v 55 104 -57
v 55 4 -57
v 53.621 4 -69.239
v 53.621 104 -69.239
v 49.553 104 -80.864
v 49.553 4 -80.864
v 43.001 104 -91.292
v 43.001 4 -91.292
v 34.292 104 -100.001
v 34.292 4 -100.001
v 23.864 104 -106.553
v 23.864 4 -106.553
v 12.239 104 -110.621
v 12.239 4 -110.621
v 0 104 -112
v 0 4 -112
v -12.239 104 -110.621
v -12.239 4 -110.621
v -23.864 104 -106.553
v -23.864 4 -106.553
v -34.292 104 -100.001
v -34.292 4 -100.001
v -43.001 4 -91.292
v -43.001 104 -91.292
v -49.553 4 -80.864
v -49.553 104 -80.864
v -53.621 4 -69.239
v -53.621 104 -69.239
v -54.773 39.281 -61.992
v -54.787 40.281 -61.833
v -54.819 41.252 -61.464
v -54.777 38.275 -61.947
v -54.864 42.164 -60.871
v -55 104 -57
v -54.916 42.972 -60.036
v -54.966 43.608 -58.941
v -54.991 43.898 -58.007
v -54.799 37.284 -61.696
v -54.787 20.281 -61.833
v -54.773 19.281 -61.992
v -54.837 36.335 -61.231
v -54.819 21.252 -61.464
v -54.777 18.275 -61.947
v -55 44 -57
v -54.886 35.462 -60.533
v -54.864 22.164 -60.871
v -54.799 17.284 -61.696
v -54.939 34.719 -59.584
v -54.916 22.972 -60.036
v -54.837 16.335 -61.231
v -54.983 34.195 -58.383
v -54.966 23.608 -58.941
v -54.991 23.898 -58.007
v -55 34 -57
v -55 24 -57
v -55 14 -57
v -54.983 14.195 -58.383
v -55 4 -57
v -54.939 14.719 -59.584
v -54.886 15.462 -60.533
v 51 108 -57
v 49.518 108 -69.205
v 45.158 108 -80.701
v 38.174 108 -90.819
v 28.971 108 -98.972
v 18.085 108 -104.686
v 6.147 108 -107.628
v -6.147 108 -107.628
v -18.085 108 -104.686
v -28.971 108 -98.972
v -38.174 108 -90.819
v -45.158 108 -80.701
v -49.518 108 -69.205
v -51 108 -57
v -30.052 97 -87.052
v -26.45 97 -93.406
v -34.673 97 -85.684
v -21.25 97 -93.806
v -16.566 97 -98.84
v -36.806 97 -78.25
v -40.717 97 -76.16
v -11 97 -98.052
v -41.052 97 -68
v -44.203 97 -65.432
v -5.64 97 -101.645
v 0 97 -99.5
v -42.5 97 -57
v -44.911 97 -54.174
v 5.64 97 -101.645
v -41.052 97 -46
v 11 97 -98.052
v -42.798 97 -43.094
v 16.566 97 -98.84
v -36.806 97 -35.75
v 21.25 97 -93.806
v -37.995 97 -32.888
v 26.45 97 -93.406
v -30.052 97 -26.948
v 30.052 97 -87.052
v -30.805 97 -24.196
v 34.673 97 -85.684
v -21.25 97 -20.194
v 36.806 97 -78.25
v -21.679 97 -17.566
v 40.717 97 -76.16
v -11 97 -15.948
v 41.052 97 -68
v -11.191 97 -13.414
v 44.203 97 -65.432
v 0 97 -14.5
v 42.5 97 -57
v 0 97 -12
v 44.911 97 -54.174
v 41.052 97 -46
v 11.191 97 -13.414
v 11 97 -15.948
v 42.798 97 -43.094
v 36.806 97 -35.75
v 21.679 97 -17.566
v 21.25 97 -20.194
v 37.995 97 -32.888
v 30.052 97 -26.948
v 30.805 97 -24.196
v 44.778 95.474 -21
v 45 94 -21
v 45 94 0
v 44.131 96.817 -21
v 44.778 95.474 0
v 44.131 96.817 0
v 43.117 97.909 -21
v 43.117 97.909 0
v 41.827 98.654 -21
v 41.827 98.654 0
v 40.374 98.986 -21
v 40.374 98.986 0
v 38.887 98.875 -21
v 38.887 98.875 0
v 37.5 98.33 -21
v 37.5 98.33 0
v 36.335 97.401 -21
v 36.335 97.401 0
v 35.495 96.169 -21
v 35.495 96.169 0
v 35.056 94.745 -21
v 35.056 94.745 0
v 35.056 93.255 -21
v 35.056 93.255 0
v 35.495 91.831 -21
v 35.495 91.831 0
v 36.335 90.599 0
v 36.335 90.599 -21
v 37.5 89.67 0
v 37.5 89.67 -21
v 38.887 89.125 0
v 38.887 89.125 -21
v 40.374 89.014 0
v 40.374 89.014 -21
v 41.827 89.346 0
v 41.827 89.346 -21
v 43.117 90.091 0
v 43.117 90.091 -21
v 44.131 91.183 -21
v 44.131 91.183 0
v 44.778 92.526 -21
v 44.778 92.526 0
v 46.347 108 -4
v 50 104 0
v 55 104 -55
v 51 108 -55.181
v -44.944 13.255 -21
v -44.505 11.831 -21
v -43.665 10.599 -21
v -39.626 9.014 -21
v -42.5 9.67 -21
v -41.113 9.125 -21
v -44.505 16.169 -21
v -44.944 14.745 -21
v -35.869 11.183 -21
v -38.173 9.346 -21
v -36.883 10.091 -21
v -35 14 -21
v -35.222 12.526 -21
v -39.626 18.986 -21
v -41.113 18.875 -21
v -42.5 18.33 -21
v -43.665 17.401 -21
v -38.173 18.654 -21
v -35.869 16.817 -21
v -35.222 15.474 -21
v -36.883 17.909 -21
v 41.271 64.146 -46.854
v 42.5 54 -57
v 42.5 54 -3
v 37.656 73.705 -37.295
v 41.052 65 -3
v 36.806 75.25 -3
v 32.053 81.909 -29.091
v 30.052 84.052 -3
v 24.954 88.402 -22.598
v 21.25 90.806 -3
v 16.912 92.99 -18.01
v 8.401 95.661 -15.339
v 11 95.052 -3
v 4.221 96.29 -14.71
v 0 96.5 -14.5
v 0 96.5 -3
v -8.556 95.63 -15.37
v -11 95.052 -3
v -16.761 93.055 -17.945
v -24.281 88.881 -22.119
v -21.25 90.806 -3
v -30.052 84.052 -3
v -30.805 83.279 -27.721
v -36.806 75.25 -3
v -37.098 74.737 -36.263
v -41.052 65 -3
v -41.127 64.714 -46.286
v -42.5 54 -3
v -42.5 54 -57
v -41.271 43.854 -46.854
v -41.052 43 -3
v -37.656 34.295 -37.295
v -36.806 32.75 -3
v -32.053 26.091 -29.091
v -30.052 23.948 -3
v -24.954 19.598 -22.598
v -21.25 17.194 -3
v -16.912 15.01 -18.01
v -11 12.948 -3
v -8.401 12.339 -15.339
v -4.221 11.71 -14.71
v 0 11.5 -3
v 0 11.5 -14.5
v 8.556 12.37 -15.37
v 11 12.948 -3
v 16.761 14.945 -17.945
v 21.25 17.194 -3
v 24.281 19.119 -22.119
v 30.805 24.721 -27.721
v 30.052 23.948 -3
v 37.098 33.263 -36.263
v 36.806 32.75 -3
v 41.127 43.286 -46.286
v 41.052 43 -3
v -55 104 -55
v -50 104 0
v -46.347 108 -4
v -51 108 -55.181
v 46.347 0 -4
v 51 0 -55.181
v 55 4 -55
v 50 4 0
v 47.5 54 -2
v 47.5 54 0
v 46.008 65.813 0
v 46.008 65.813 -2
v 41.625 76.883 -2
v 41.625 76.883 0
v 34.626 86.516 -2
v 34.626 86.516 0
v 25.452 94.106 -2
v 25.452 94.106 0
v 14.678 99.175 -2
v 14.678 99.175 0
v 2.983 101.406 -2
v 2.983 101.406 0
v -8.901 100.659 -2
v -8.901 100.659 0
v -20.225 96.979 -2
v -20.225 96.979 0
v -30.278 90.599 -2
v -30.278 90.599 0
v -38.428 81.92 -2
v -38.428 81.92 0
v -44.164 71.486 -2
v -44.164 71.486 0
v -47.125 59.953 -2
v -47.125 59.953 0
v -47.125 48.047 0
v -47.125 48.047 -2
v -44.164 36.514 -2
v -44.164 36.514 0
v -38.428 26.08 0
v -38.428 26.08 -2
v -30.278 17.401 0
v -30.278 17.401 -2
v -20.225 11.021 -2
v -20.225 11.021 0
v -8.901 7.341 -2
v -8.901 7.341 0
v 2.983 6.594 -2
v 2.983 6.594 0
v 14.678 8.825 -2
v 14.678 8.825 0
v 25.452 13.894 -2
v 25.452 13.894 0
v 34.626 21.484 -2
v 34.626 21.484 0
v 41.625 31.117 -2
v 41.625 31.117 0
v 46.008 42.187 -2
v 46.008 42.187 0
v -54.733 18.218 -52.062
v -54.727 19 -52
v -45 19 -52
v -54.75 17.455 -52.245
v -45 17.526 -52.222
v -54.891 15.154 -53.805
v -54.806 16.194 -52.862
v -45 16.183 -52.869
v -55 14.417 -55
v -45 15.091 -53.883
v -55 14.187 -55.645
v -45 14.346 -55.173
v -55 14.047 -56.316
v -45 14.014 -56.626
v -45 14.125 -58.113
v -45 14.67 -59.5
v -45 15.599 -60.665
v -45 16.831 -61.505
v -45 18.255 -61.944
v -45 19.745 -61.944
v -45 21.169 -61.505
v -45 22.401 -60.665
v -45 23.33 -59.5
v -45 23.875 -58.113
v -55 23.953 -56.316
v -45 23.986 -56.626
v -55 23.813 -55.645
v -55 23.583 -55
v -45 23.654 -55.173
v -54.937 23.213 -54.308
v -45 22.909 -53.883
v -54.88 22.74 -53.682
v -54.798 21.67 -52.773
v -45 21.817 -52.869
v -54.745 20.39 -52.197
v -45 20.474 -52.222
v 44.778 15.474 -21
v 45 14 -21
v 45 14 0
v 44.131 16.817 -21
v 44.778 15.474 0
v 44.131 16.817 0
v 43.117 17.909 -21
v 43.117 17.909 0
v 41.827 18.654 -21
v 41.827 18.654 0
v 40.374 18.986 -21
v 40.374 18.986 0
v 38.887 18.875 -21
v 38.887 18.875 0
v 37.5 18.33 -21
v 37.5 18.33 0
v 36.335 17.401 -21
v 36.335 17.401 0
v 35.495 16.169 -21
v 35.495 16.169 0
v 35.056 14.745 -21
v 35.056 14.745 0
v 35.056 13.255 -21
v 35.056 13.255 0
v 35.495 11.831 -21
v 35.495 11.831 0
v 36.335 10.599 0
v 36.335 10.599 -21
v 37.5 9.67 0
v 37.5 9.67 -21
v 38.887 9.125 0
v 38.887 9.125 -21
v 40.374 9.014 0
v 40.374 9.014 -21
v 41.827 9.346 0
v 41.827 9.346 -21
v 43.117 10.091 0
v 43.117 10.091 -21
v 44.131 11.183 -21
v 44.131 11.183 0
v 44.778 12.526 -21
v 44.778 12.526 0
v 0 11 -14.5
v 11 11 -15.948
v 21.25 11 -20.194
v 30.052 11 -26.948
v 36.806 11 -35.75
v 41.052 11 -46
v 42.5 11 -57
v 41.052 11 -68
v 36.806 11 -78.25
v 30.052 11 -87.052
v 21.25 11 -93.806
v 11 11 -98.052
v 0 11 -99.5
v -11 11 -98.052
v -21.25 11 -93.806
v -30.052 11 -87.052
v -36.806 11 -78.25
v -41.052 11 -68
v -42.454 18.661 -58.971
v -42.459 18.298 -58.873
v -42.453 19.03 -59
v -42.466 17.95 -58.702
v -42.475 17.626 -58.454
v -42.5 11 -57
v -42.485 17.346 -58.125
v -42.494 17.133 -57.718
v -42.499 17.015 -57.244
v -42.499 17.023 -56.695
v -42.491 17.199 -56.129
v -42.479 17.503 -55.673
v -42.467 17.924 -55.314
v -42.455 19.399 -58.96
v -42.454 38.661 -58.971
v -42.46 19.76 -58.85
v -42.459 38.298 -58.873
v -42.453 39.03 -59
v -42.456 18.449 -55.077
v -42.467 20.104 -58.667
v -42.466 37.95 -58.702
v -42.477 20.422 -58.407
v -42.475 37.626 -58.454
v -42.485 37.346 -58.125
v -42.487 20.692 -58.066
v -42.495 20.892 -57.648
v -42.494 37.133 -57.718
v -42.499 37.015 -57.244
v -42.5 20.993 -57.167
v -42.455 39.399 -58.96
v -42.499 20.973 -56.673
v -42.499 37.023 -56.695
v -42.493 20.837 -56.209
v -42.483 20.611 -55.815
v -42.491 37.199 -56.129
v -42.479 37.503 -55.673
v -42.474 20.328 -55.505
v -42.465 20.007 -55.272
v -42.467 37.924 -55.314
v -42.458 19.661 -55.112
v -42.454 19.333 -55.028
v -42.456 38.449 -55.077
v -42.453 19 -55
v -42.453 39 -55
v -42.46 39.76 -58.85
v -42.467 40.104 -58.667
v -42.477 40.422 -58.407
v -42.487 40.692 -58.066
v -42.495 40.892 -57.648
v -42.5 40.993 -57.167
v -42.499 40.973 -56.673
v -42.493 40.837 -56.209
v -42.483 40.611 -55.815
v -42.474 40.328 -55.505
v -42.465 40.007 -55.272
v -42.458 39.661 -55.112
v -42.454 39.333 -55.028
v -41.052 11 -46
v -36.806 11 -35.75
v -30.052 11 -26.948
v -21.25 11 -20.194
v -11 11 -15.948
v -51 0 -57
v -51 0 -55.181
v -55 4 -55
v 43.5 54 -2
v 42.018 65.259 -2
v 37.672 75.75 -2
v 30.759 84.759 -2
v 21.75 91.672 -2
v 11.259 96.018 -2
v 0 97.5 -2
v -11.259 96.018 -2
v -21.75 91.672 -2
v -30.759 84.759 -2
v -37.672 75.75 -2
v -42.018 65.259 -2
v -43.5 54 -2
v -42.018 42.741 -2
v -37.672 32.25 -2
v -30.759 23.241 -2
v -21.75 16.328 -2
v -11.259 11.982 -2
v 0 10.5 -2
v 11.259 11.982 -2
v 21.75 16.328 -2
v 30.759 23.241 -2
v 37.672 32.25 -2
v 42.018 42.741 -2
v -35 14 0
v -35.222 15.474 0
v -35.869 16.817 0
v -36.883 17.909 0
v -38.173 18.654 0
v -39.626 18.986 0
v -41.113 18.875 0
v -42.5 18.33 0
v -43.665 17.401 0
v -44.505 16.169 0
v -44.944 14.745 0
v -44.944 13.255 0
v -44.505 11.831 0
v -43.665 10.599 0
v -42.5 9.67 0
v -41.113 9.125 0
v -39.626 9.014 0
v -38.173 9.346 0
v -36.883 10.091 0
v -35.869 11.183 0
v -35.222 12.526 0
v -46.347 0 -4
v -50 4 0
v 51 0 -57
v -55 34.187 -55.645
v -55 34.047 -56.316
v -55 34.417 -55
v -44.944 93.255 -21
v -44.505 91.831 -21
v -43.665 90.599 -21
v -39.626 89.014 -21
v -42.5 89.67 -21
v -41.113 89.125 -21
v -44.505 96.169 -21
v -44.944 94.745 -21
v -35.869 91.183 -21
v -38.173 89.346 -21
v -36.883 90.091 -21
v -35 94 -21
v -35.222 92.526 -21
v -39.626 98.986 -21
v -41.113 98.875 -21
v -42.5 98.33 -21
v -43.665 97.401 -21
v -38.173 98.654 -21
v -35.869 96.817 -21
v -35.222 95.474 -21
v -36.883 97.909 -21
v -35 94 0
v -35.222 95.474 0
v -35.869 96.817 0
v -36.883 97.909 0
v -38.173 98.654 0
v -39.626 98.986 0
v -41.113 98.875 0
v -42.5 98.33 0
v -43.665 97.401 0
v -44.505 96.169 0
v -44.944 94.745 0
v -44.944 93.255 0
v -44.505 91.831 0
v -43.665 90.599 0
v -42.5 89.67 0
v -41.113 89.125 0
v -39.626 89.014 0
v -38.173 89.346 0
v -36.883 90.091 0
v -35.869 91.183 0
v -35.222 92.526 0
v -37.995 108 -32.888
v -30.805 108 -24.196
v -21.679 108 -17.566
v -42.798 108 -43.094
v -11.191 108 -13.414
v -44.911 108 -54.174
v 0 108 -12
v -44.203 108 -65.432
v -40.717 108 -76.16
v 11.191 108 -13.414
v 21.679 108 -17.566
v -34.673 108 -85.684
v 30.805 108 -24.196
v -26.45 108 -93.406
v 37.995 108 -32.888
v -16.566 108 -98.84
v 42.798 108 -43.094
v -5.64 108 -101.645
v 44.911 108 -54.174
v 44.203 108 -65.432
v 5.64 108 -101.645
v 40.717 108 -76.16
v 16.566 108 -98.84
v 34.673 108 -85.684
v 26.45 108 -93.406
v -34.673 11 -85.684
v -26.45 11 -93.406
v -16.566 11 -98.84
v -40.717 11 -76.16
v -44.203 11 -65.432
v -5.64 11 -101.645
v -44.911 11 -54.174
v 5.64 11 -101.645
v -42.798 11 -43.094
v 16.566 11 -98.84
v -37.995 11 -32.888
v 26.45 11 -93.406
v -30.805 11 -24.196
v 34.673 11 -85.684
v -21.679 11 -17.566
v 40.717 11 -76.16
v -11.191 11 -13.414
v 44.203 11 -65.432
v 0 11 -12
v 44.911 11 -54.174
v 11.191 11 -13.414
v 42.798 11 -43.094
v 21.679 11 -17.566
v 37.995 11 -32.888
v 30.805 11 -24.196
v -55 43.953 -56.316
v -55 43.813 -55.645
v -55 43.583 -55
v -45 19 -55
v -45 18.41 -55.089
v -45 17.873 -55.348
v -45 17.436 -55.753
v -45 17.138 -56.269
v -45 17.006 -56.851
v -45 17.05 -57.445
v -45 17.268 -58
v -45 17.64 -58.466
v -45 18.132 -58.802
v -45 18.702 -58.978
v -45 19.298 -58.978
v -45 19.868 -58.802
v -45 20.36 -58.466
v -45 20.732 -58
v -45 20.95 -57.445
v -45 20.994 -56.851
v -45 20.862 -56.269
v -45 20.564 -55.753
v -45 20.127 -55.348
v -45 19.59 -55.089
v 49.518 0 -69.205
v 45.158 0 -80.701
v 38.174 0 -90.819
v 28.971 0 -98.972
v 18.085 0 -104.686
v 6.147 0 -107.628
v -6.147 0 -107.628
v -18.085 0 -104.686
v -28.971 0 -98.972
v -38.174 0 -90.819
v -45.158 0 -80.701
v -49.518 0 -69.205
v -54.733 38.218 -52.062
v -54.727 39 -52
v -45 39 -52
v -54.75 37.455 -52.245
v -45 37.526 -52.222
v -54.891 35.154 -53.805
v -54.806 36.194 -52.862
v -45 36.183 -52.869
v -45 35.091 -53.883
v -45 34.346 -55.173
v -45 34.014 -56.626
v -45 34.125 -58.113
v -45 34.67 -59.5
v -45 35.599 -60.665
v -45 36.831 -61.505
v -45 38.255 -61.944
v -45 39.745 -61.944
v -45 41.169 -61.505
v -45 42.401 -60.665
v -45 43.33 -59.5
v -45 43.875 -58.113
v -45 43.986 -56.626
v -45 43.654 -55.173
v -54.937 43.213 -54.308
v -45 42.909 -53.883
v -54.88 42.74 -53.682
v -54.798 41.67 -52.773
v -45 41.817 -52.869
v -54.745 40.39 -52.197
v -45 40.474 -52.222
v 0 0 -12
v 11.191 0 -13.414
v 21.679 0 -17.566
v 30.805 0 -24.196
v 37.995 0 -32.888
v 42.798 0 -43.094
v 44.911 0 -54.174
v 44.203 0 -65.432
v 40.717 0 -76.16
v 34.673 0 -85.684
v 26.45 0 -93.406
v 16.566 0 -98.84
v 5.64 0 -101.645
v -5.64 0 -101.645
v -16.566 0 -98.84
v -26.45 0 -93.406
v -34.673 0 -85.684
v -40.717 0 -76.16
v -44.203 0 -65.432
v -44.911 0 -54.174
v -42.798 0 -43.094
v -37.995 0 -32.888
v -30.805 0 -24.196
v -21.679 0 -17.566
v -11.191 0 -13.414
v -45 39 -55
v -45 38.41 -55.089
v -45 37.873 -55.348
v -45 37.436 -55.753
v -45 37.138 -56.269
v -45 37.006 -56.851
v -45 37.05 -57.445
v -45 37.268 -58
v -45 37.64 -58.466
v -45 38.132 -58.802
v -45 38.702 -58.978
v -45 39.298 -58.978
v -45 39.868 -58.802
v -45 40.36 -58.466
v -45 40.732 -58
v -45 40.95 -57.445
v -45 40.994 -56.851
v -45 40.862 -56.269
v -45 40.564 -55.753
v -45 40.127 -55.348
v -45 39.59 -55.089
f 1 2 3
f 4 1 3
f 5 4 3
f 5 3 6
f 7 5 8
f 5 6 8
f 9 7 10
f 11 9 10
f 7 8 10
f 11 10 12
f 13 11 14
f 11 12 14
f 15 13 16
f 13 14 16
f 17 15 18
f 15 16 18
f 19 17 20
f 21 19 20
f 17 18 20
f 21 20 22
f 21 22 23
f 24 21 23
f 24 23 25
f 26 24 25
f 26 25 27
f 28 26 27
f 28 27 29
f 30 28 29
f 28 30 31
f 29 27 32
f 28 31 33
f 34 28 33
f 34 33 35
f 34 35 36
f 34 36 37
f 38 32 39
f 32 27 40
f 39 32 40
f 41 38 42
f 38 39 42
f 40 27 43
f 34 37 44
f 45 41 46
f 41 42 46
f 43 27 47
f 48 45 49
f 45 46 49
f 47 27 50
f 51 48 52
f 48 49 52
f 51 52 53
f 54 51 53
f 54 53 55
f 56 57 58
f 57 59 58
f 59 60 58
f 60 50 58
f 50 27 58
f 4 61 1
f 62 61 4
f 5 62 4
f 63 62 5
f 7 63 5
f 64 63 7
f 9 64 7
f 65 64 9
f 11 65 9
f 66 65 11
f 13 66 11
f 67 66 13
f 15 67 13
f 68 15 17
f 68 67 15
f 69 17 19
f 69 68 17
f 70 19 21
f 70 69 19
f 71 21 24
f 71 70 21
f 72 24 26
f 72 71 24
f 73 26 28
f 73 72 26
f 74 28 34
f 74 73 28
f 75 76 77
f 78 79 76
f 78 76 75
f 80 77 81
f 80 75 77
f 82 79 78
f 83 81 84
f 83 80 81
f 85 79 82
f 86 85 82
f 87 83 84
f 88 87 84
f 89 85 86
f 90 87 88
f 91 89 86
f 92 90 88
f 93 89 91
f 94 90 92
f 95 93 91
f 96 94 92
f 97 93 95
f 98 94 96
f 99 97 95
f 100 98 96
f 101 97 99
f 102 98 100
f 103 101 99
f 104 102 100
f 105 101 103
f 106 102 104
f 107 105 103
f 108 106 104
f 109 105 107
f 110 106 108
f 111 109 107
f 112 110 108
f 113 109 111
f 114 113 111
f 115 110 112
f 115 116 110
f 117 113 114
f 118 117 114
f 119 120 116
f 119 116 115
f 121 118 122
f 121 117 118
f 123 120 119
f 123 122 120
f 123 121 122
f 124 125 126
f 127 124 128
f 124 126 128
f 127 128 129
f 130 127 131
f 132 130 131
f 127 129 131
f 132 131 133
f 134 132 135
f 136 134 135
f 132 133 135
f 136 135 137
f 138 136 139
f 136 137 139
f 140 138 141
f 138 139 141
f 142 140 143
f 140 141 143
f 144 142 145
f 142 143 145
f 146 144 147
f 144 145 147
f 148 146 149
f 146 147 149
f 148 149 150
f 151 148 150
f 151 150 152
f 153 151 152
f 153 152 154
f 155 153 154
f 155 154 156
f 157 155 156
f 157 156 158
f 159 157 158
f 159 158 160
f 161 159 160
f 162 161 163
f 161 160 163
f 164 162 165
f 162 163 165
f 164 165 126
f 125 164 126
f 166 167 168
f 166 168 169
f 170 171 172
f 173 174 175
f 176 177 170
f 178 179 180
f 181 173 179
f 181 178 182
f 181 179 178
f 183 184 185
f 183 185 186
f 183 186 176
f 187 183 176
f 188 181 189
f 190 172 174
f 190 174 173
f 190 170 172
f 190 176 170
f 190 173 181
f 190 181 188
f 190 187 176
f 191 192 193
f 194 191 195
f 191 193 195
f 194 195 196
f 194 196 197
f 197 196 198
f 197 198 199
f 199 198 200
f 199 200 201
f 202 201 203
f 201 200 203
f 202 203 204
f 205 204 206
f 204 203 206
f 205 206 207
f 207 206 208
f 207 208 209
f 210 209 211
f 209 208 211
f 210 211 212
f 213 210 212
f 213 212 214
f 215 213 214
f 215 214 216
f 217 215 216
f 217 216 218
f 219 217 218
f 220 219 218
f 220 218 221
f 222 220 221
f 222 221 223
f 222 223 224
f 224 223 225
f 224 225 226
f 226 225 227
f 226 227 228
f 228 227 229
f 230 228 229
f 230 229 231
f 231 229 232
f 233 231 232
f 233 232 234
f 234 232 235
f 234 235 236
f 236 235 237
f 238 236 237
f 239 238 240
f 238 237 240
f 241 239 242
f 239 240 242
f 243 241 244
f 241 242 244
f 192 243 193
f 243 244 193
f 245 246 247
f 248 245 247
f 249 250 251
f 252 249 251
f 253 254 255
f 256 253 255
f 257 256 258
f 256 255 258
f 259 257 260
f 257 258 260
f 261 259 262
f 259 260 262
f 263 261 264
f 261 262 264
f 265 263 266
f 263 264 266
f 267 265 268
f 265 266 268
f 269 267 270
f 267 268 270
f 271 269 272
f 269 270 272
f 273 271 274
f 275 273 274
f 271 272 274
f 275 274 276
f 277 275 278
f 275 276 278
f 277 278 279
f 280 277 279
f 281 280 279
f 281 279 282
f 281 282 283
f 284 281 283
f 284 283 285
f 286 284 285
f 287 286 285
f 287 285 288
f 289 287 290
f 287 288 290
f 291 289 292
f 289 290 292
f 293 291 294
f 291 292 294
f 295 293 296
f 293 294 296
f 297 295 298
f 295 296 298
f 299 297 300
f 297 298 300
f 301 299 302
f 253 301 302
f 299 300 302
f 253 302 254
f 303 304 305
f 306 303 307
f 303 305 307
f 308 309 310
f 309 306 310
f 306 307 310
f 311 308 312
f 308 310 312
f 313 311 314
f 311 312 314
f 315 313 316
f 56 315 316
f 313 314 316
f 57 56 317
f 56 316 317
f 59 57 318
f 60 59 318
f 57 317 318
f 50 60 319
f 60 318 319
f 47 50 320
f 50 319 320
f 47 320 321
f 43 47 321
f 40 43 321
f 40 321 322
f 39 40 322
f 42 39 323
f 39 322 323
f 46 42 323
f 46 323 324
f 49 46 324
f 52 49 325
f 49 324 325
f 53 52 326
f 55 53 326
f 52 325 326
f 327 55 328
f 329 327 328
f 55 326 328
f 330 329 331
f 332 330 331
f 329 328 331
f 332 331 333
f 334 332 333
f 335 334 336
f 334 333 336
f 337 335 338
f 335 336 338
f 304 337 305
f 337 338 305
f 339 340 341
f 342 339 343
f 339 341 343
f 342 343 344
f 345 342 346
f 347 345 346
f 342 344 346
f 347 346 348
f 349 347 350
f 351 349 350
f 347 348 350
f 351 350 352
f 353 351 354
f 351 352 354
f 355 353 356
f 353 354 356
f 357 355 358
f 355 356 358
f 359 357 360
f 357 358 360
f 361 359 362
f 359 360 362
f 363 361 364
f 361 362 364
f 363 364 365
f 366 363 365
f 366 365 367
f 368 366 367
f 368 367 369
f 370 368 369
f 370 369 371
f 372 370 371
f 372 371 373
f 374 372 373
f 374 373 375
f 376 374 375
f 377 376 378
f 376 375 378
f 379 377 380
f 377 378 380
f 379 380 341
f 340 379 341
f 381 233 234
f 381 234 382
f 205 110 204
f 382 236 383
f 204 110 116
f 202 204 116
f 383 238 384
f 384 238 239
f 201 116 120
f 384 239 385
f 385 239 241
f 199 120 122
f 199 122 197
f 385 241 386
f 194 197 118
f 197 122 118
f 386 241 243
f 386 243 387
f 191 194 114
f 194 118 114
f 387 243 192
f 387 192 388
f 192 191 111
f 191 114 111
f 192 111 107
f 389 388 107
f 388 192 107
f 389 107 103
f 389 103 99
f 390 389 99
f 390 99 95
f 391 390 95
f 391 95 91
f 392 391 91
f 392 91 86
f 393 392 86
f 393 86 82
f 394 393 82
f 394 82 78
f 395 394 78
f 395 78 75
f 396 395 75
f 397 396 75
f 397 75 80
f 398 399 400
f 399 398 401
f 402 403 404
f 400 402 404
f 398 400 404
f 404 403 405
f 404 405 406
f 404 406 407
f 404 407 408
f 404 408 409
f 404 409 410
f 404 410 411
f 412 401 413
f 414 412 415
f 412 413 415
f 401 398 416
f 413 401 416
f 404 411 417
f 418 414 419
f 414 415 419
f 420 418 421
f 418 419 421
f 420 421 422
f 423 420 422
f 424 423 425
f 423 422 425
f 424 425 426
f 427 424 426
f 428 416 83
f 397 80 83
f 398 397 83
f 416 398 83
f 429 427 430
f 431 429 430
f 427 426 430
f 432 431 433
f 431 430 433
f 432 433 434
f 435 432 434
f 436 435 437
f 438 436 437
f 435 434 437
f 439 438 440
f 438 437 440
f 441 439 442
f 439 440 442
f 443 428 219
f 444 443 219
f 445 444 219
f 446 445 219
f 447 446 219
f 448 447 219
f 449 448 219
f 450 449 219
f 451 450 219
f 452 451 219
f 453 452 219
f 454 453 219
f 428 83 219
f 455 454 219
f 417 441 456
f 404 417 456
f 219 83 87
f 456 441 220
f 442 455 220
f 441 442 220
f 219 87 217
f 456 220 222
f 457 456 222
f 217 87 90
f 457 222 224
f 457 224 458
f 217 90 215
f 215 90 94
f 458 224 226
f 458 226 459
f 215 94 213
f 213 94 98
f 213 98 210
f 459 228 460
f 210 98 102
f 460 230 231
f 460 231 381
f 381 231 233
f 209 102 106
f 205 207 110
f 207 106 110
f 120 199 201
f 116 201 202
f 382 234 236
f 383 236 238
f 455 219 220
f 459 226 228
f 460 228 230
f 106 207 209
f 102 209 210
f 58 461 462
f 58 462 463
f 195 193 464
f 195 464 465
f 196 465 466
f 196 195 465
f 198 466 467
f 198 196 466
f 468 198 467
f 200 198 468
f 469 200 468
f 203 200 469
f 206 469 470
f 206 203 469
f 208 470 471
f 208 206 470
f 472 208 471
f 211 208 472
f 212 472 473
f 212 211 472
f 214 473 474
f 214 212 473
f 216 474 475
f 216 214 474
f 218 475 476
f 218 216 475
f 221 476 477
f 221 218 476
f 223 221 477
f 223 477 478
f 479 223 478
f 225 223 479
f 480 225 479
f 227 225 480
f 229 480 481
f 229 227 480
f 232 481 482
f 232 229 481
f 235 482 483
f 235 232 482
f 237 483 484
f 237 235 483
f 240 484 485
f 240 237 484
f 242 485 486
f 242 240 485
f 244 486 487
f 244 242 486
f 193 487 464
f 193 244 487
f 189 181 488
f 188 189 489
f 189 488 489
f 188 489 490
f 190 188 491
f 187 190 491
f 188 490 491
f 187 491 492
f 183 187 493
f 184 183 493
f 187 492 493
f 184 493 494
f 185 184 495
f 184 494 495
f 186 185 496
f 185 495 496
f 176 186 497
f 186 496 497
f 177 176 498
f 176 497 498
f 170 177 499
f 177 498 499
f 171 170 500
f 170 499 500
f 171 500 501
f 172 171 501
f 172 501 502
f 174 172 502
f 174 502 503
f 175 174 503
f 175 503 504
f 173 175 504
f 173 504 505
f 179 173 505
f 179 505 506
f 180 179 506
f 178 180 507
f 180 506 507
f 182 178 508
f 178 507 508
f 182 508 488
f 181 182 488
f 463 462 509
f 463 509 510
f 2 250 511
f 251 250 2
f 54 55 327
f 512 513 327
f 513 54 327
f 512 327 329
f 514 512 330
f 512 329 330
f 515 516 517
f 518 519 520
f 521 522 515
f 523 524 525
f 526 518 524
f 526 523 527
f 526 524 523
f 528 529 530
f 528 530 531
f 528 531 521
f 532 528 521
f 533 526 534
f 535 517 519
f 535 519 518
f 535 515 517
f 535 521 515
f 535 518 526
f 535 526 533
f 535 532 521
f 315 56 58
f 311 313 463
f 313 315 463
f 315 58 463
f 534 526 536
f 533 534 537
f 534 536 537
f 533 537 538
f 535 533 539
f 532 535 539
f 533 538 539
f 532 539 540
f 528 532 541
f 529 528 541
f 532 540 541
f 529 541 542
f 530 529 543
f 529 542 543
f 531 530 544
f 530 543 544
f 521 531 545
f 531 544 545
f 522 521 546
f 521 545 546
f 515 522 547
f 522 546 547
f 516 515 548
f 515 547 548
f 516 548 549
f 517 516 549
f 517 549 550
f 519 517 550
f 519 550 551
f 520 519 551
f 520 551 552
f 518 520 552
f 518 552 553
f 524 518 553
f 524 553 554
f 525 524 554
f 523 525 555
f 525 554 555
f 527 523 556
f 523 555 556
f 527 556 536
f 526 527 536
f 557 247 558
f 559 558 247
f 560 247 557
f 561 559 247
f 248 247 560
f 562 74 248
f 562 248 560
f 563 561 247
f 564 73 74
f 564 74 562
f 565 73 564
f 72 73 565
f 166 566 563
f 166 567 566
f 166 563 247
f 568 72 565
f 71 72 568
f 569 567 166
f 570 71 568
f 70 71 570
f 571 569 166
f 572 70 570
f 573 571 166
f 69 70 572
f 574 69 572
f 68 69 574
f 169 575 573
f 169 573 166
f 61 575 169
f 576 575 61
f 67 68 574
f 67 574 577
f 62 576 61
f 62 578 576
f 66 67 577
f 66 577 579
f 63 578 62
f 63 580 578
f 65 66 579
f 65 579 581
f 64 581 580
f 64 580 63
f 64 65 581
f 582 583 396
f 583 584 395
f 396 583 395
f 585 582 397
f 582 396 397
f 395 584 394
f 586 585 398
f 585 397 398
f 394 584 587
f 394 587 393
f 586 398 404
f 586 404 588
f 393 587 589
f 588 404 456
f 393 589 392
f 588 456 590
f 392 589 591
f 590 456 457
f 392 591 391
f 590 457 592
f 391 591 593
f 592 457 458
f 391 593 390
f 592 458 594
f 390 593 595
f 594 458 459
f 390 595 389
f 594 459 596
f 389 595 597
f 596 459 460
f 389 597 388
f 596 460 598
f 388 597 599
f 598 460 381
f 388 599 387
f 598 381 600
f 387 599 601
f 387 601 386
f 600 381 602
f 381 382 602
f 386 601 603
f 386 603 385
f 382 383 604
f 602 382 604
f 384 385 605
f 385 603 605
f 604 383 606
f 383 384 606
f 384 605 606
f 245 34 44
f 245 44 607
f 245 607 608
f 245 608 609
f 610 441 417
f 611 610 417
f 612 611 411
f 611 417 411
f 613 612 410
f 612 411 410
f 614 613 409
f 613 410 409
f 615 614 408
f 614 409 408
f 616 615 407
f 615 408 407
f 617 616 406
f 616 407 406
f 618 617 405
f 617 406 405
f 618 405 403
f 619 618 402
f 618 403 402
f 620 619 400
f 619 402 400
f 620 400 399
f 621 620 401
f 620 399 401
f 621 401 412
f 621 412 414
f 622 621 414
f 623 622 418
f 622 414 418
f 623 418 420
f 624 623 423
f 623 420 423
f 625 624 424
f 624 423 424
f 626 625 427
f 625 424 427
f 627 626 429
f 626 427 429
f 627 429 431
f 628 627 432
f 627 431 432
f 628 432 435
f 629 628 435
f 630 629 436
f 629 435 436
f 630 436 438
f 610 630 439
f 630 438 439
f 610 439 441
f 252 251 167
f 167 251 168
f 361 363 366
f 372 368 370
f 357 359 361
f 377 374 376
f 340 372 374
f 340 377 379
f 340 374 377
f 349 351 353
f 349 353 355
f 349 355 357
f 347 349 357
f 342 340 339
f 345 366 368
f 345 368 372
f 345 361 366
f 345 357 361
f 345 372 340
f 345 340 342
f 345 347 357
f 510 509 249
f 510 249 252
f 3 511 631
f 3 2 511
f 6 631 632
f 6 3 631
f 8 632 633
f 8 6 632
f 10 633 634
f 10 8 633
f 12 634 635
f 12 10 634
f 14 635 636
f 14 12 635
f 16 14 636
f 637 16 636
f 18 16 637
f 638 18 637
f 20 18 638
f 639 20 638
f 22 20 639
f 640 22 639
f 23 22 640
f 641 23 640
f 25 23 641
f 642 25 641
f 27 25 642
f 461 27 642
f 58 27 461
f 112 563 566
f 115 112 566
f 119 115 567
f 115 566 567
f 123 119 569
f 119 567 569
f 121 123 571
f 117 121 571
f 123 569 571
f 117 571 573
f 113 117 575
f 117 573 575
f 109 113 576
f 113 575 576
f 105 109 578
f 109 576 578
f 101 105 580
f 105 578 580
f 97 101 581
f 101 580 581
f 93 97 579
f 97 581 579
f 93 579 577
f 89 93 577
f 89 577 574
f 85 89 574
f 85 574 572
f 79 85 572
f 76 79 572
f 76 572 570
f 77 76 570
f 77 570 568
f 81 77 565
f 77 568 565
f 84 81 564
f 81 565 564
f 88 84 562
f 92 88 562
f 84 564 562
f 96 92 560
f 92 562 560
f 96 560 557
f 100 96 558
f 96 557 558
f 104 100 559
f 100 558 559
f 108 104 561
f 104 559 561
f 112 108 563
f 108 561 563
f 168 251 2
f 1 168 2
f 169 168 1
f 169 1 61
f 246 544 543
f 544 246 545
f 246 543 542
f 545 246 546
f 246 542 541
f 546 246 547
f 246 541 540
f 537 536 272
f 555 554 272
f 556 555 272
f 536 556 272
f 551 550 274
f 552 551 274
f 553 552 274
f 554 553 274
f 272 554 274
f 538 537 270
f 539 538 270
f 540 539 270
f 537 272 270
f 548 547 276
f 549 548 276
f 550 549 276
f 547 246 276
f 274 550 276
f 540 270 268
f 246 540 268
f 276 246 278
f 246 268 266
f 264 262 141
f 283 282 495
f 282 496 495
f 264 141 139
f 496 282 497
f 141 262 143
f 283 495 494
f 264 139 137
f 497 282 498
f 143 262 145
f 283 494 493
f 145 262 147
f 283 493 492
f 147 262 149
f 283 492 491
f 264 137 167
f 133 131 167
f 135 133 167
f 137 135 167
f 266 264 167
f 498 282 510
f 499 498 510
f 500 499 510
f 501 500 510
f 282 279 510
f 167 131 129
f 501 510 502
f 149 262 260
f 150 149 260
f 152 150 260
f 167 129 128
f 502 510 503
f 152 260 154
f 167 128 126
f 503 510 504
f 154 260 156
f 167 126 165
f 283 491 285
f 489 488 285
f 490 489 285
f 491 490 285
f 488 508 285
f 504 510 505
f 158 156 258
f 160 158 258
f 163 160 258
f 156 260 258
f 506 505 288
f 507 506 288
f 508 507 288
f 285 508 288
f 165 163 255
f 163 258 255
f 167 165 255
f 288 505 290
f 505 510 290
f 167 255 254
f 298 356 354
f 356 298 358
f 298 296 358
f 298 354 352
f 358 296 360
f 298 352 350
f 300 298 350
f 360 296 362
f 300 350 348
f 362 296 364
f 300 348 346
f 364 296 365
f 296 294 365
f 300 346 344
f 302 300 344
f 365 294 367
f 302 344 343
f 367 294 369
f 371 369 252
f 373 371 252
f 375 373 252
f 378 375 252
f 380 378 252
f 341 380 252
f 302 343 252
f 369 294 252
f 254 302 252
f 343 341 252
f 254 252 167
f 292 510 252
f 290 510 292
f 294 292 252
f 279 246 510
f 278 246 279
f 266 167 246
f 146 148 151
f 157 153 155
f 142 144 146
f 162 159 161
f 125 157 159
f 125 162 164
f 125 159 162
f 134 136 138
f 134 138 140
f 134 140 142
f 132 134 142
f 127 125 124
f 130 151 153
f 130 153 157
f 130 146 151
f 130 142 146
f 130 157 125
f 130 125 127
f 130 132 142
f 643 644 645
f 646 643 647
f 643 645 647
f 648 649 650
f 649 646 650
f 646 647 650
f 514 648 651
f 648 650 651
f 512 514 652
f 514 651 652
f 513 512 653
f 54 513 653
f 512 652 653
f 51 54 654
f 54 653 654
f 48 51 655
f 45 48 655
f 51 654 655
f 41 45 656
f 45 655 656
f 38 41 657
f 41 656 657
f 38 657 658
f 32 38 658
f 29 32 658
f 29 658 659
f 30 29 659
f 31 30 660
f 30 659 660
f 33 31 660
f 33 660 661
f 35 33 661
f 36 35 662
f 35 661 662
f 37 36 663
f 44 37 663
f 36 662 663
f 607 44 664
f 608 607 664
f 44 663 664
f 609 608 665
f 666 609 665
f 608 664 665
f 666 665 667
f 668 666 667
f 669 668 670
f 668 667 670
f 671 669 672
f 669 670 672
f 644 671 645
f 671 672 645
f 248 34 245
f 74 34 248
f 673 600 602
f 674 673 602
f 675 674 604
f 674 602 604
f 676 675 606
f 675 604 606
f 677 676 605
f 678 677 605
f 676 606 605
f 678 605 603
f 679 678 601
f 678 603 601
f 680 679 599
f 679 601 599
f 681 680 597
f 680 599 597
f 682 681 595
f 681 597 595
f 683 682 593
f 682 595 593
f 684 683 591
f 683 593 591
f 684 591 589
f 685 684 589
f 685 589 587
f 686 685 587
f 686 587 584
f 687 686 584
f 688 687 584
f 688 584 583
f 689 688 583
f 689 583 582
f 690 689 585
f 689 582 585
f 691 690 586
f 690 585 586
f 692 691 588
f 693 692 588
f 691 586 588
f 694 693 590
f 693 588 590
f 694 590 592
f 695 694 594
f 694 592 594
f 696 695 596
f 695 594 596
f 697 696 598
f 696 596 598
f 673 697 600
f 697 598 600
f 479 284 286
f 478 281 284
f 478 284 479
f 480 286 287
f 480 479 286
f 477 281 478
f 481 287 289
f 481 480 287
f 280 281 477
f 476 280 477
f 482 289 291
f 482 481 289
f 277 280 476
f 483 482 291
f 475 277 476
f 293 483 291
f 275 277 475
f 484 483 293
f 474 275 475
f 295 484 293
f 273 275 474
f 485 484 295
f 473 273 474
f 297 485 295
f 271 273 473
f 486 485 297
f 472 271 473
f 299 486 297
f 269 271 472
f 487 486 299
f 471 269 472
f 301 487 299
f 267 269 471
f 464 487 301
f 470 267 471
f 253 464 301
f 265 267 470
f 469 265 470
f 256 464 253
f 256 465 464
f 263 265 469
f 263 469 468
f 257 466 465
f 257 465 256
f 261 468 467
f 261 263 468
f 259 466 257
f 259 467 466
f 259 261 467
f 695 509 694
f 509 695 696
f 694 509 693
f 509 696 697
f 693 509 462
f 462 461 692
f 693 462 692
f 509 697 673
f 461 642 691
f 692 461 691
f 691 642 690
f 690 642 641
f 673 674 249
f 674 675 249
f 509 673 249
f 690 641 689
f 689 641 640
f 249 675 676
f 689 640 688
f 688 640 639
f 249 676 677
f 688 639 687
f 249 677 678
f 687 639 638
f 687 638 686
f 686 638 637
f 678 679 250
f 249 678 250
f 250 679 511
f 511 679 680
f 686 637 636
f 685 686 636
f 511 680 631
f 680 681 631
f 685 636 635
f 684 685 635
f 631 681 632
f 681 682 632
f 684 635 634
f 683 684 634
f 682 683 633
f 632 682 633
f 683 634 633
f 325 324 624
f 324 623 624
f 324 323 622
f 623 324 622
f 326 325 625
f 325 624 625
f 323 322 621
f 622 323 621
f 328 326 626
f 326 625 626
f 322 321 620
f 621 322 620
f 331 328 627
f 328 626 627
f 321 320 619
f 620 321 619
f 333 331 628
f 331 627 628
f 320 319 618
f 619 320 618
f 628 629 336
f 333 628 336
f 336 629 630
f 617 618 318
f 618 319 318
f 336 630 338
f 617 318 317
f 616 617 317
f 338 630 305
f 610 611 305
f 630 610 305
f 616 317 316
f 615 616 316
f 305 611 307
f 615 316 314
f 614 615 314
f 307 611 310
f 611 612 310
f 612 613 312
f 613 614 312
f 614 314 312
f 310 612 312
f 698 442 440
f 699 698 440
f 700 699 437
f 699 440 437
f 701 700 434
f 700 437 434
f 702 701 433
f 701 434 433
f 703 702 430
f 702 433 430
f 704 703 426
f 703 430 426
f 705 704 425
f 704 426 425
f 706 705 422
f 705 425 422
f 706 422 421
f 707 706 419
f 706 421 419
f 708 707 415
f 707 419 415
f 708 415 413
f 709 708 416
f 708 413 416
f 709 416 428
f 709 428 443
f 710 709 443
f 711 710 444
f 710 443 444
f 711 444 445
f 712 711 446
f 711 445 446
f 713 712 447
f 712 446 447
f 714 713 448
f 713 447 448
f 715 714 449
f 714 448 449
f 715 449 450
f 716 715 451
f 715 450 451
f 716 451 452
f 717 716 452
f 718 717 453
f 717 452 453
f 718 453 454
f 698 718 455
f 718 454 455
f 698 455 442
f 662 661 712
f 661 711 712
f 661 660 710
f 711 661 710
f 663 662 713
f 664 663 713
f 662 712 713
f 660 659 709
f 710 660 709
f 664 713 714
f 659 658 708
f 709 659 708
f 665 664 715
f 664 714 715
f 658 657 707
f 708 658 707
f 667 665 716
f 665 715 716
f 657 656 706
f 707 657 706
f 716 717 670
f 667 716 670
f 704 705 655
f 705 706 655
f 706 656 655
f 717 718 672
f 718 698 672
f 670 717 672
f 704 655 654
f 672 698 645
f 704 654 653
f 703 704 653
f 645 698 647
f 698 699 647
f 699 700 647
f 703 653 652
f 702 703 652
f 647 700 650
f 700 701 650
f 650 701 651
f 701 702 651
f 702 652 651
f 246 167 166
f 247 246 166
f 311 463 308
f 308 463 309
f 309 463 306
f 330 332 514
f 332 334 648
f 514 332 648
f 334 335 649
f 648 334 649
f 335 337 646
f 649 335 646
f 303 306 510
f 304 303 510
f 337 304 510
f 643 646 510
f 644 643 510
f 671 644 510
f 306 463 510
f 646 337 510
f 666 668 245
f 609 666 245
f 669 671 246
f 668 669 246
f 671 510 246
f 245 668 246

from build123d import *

# Parameters (mm, degrees)
EXTRUDE_1_DEPTH          = 108
CHAMFER_1_SIZE           = 55
CHAMFER_1_SIZE2          = 5
CHAMFER_2_SIZE           = 5
CHAMFER_2_SIZE2          = 55
CHAMFER_3_SIZE           = 4
SKETCH_2_R               = 42.5
CUT_EXTRUDE_1_DEPTH      = 108
SKETCH_3_R               = 45
CUT_EXTRUDE_2_DEPTH      = 11
CUT_EXTRUDE_START        = -97
SKETCH_3_2_R             = 45
CUT_EXTRUDE_3_DEPTH      = 11
SKETCH_4_R               = 5
CUT_EXTRUDE_4_DEPTH      = 21
SKETCH_8_R               = 47.5
CUT_EXTRUDE_5_DEPTH      = 2
CUT_EXTRUDE_6_REACH      = 165.673
CUT_EXTRUDE_6_END_RADIUS = 42.5
SKETCH_9_R               = 42.5
CHAMFER_4_SIZE           = 1


with BuildPart() as part:
    # 草图1 → 凸台-拉伸1 (new body)
    with BuildSketch(Plane(origin=(0, 0, 0), x_dir=(1, 0, 0), z_dir=(0, 1, 0))):
        with BuildLine():
            Line((-55, 0), (55, 0))
            Line((55, 0), (55, 57))
            ThreePointArc((55, 57), (0, 112), (-55, 57))
            Line((-55, 57), (-55, 0))
        make_face()
    extrude(amount=EXTRUDE_1_DEPTH)

    # 倒角1
    chamfer_1_edges = [part.edges().sort_by_distance(p)[0] for p in [
        (-55, 54, 0),
    ]]
    chamfer_1_side = [part.faces().sort_by_distance(p)[0] for p in [
        (-55, 54, -28.5),
    ]]
    chamfer(chamfer_1_edges, length=CHAMFER_1_SIZE, length2=CHAMFER_1_SIZE2, reference=chamfer_1_side[0])

    # 倒角2
    chamfer_2_edges = [part.edges().sort_by_distance(p)[0] for p in [
        (55, 54, 0),
    ]]
    chamfer_2_side = [part.faces().sort_by_distance(p)[0] for p in [
        (2.5, 54, 0),
    ]]
    chamfer(chamfer_2_edges, length=CHAMFER_2_SIZE, length2=CHAMFER_2_SIZE2, reference=chamfer_2_side[0])

    # 倒角3
    # the kernel refuses this chamfer: 4 mm, written as the material it takes off along each edge
    with BuildSketch(Plane(origin=(-55, 108, -57), x_dir=(-0.027495876610585647, -0.9996219169112968, 0), z_dir=(0, 0, 1)), Plane(origin=(55, 0, -44.713268048), x_dir=(-0.9996219169112968, -0.02749587661058639, 0), z_dir=(0, 0, -1)), Plane(origin=(55, 108, -44.713268048), x_dir=(0.027495876610585647, -0.9996219169112968, 0), z_dir=(0, 0, -1)), Plane(origin=(-55, 0, -57), x_dir=(0.9996219169112968, -0.02749587661058639, 0), z_dir=(0, 0, 1))) as chamfer_3_piece_1:
        Polygon((CHAMFER_3_SIZE * 0.999621916911, CHAMFER_3_SIZE * 0.0274958766106), (-CHAMFER_3_SIZE * 0.0274958766106, CHAMFER_3_SIZE * 0.999621916911), (0, 0), align=None)
    extrude(amount=12.286731952, mode=Mode.SUBTRACT)
    with BuildSketch(Plane(origin=(-60.286731952, 0, 0), x_dir=(0, -0.027495876610586372, -0.9996219169112968), z_dir=(1, 0, 0)), Plane(origin=(-60.286731952, 108, 0), x_dir=(0, -0.9996219169112968, 0.02749587661058639), z_dir=(1, 0, 0))) as chamfer_3_piece_2:
        Polygon((CHAMFER_3_SIZE * 0.999621916911, CHAMFER_3_SIZE * 0.0274958766106), (-CHAMFER_3_SIZE * 0.0274958766106, CHAMFER_3_SIZE * 0.999621916911), (0, 0), align=None)
    extrude(amount=120.573463904, mode=Mode.SUBTRACT)
    with BuildSketch(Plane(origin=(-55.931316952, 0, -65.244486468), x_dir=(0.995516676088184, -0.027495876610586417, -0.09050151600801698), z_dir=(0.09053574604251878, 0, 0.9958932064677039)), Plane(origin=(-55.931316952, 108, -65.244486468), x_dir=(-0.027382956722356327, -0.9996219169112968, 0.0024893597020324005), z_dir=(0.09053574604251878, 0, 0.9958932064677039)), Plane(origin=(49.068683048, 0, 10.244486468), x_dir=(-0.995516676088184, -0.027495876610586358, -0.09050151600801698), z_dir=(0.09053574604251878, 0, -0.9958932064677039)), Plane(origin=(49.068683048, 108, 10.244486468), x_dir=(0.027382956722356445, -0.9996219169112968, 0.0024893597020324114), z_dir=(0.09053574604251878, 0, -0.9958932064677039))) as chamfer_3_piece_3:
        Polygon((CHAMFER_3_SIZE * 0.999621916911, CHAMFER_3_SIZE * 0.0274958766106), (-CHAMFER_3_SIZE * 0.0274958766106, CHAMFER_3_SIZE * 0.999621916911), (0, 0), align=None)
    extrude(amount=75.80026899, mode=Mode.SUBTRACT)
    with BuildSketch(Plane(origin=(0, 0, -57), x_dir=(1, 0, 0), z_dir=(0, 0, 1))) as chamfer_3_piece_4:
        Polygon((55 - CHAMFER_3_SIZE, 0), (55, CHAMFER_3_SIZE), (55, 0), align=None)
    revolve(axis=Axis((0, 0, -57), (0, 1, 0)), revolution_arc=180, mode=Mode.SUBTRACT)
    with BuildSketch(Plane(origin=(0, 108, -57), x_dir=(1, 0, 0), z_dir=(0, 0, 1))) as chamfer_3_piece_5:
        Polygon((55, -CHAMFER_3_SIZE), (55 - CHAMFER_3_SIZE, 0), (55, 0), align=None)
    revolve(axis=Axis((0, 108, -57), (0, 1, 0)), revolution_arc=180, mode=Mode.SUBTRACT)

    # 草图2 → 切除-拉伸1 (cut)
    with BuildSketch(Plane(origin=(0, 108, 0), x_dir=(1, 0, 0), z_dir=(0, 1, 0))):
        with Locations(Location((0, 57, 0), (0, 0, 270))):
            Circle(SKETCH_2_R)
    extrude(amount=-CUT_EXTRUDE_1_DEPTH, mode=Mode.SUBTRACT)

    # 草图3 → 切除-拉伸2 (cut)
    with BuildSketch(Plane(origin=(0, 108, 0), x_dir=(1, 0, 0), z_dir=(0, 1, 0))):
        with Locations(Location((0, 57, 0), (0, 0, 270))):
            Circle(SKETCH_3_R)
    extrude(amount=-CUT_EXTRUDE_2_DEPTH, mode=Mode.SUBTRACT)

    # 草图3<2> → 切除-拉伸3 (cut)
    with BuildSketch(Plane(origin=(0, 108, 0), x_dir=(1, 0, 0), z_dir=(0, 1, 0)).offset(CUT_EXTRUDE_START)):
        with Locations(Location((0, 57, 0), (0, 0, 270))):
            Circle(SKETCH_3_2_R)
    extrude(amount=-CUT_EXTRUDE_3_DEPTH, mode=Mode.SUBTRACT)

    # 草图4 → 切除-拉伸4 (cut)
    with BuildSketch(Plane.XY):
        with Locations((40, 94)):
            Circle(SKETCH_4_R)
        with Locations((40, 14)):
            Circle(SKETCH_4_R)
        with Locations((-40, 14)):
            Circle(SKETCH_4_R)
        with Locations((-40, 94)):
            Circle(SKETCH_4_R)
    extrude(amount=-CUT_EXTRUDE_4_DEPTH, mode=Mode.SUBTRACT)

    # 草图6 → 切除-旋转1 (revolve, cut)
    with BuildSketch(Plane(origin=(0, 19, 0), x_dir=(-1, 0, 0), z_dir=(0, -1, 0))):
        Polygon((55, 57), (55, 52), (45, 52), (45, 55), (35, 55), (35, 57), align=None)
    revolve(axis=Axis((-55, 19, -57), (1, 0, 0)), mode=Mode.SUBTRACT)

    # 草图7 → 切除-旋转2 (revolve, cut)
    with BuildSketch(Plane(origin=(0, 39, 0), x_dir=(-1, 0, 0), z_dir=(0, -1, 0))):
        Polygon((35, 55), (35, 57), (55, 57), (55, 52), (45, 52), (45, 55), align=None)
    revolve(axis=Axis((-55, 39, -57), (1, 0, 0)), mode=Mode.SUBTRACT)

    # 草图8 → 切除-拉伸5 (cut)
    with BuildSketch(Plane.XY):
        with Locations((0, 54)):
            Circle(SKETCH_8_R)
    extrude(amount=-CUT_EXTRUDE_5_DEPTH, mode=Mode.SUBTRACT)

    # 切除-拉伸6: up to this cylinder (the profile starts outside it)
    cut_extrude_6_end = Plane(origin=(0, 54, -57), z_dir=(0, 1, 0)) * Cylinder(CUT_EXTRUDE_6_END_RADIUS, 417.346, mode=Mode.PRIVATE)
    # 草图9 → 切除-拉伸6 (cut, up to the surface)
    with BuildSketch(Plane.XY.offset(-2), mode=Mode.PRIVATE) as cut_extrude_6_sk1:
        with Locations((0, 54)):
            Circle(SKETCH_9_R)
    cut_extrude_6_tool1 = extrude(cut_extrude_6_sk1.sketch, amount=-CUT_EXTRUDE_6_REACH, mode=Mode.PRIVATE) - cut_extrude_6_end
    add(cut_extrude_6_tool1.solids().sort_by_distance((0, 54, -2))[0], mode=Mode.SUBTRACT)

    # 倒角4
    chamfer_4_edges = [part.edges().sort_by_distance(p)[0] for p in [
        (-42.5, 54, -2),
    ]]
    chamfer(chamfer_4_edges, length=CHAMFER_4_SIZE)


solid = part.part
